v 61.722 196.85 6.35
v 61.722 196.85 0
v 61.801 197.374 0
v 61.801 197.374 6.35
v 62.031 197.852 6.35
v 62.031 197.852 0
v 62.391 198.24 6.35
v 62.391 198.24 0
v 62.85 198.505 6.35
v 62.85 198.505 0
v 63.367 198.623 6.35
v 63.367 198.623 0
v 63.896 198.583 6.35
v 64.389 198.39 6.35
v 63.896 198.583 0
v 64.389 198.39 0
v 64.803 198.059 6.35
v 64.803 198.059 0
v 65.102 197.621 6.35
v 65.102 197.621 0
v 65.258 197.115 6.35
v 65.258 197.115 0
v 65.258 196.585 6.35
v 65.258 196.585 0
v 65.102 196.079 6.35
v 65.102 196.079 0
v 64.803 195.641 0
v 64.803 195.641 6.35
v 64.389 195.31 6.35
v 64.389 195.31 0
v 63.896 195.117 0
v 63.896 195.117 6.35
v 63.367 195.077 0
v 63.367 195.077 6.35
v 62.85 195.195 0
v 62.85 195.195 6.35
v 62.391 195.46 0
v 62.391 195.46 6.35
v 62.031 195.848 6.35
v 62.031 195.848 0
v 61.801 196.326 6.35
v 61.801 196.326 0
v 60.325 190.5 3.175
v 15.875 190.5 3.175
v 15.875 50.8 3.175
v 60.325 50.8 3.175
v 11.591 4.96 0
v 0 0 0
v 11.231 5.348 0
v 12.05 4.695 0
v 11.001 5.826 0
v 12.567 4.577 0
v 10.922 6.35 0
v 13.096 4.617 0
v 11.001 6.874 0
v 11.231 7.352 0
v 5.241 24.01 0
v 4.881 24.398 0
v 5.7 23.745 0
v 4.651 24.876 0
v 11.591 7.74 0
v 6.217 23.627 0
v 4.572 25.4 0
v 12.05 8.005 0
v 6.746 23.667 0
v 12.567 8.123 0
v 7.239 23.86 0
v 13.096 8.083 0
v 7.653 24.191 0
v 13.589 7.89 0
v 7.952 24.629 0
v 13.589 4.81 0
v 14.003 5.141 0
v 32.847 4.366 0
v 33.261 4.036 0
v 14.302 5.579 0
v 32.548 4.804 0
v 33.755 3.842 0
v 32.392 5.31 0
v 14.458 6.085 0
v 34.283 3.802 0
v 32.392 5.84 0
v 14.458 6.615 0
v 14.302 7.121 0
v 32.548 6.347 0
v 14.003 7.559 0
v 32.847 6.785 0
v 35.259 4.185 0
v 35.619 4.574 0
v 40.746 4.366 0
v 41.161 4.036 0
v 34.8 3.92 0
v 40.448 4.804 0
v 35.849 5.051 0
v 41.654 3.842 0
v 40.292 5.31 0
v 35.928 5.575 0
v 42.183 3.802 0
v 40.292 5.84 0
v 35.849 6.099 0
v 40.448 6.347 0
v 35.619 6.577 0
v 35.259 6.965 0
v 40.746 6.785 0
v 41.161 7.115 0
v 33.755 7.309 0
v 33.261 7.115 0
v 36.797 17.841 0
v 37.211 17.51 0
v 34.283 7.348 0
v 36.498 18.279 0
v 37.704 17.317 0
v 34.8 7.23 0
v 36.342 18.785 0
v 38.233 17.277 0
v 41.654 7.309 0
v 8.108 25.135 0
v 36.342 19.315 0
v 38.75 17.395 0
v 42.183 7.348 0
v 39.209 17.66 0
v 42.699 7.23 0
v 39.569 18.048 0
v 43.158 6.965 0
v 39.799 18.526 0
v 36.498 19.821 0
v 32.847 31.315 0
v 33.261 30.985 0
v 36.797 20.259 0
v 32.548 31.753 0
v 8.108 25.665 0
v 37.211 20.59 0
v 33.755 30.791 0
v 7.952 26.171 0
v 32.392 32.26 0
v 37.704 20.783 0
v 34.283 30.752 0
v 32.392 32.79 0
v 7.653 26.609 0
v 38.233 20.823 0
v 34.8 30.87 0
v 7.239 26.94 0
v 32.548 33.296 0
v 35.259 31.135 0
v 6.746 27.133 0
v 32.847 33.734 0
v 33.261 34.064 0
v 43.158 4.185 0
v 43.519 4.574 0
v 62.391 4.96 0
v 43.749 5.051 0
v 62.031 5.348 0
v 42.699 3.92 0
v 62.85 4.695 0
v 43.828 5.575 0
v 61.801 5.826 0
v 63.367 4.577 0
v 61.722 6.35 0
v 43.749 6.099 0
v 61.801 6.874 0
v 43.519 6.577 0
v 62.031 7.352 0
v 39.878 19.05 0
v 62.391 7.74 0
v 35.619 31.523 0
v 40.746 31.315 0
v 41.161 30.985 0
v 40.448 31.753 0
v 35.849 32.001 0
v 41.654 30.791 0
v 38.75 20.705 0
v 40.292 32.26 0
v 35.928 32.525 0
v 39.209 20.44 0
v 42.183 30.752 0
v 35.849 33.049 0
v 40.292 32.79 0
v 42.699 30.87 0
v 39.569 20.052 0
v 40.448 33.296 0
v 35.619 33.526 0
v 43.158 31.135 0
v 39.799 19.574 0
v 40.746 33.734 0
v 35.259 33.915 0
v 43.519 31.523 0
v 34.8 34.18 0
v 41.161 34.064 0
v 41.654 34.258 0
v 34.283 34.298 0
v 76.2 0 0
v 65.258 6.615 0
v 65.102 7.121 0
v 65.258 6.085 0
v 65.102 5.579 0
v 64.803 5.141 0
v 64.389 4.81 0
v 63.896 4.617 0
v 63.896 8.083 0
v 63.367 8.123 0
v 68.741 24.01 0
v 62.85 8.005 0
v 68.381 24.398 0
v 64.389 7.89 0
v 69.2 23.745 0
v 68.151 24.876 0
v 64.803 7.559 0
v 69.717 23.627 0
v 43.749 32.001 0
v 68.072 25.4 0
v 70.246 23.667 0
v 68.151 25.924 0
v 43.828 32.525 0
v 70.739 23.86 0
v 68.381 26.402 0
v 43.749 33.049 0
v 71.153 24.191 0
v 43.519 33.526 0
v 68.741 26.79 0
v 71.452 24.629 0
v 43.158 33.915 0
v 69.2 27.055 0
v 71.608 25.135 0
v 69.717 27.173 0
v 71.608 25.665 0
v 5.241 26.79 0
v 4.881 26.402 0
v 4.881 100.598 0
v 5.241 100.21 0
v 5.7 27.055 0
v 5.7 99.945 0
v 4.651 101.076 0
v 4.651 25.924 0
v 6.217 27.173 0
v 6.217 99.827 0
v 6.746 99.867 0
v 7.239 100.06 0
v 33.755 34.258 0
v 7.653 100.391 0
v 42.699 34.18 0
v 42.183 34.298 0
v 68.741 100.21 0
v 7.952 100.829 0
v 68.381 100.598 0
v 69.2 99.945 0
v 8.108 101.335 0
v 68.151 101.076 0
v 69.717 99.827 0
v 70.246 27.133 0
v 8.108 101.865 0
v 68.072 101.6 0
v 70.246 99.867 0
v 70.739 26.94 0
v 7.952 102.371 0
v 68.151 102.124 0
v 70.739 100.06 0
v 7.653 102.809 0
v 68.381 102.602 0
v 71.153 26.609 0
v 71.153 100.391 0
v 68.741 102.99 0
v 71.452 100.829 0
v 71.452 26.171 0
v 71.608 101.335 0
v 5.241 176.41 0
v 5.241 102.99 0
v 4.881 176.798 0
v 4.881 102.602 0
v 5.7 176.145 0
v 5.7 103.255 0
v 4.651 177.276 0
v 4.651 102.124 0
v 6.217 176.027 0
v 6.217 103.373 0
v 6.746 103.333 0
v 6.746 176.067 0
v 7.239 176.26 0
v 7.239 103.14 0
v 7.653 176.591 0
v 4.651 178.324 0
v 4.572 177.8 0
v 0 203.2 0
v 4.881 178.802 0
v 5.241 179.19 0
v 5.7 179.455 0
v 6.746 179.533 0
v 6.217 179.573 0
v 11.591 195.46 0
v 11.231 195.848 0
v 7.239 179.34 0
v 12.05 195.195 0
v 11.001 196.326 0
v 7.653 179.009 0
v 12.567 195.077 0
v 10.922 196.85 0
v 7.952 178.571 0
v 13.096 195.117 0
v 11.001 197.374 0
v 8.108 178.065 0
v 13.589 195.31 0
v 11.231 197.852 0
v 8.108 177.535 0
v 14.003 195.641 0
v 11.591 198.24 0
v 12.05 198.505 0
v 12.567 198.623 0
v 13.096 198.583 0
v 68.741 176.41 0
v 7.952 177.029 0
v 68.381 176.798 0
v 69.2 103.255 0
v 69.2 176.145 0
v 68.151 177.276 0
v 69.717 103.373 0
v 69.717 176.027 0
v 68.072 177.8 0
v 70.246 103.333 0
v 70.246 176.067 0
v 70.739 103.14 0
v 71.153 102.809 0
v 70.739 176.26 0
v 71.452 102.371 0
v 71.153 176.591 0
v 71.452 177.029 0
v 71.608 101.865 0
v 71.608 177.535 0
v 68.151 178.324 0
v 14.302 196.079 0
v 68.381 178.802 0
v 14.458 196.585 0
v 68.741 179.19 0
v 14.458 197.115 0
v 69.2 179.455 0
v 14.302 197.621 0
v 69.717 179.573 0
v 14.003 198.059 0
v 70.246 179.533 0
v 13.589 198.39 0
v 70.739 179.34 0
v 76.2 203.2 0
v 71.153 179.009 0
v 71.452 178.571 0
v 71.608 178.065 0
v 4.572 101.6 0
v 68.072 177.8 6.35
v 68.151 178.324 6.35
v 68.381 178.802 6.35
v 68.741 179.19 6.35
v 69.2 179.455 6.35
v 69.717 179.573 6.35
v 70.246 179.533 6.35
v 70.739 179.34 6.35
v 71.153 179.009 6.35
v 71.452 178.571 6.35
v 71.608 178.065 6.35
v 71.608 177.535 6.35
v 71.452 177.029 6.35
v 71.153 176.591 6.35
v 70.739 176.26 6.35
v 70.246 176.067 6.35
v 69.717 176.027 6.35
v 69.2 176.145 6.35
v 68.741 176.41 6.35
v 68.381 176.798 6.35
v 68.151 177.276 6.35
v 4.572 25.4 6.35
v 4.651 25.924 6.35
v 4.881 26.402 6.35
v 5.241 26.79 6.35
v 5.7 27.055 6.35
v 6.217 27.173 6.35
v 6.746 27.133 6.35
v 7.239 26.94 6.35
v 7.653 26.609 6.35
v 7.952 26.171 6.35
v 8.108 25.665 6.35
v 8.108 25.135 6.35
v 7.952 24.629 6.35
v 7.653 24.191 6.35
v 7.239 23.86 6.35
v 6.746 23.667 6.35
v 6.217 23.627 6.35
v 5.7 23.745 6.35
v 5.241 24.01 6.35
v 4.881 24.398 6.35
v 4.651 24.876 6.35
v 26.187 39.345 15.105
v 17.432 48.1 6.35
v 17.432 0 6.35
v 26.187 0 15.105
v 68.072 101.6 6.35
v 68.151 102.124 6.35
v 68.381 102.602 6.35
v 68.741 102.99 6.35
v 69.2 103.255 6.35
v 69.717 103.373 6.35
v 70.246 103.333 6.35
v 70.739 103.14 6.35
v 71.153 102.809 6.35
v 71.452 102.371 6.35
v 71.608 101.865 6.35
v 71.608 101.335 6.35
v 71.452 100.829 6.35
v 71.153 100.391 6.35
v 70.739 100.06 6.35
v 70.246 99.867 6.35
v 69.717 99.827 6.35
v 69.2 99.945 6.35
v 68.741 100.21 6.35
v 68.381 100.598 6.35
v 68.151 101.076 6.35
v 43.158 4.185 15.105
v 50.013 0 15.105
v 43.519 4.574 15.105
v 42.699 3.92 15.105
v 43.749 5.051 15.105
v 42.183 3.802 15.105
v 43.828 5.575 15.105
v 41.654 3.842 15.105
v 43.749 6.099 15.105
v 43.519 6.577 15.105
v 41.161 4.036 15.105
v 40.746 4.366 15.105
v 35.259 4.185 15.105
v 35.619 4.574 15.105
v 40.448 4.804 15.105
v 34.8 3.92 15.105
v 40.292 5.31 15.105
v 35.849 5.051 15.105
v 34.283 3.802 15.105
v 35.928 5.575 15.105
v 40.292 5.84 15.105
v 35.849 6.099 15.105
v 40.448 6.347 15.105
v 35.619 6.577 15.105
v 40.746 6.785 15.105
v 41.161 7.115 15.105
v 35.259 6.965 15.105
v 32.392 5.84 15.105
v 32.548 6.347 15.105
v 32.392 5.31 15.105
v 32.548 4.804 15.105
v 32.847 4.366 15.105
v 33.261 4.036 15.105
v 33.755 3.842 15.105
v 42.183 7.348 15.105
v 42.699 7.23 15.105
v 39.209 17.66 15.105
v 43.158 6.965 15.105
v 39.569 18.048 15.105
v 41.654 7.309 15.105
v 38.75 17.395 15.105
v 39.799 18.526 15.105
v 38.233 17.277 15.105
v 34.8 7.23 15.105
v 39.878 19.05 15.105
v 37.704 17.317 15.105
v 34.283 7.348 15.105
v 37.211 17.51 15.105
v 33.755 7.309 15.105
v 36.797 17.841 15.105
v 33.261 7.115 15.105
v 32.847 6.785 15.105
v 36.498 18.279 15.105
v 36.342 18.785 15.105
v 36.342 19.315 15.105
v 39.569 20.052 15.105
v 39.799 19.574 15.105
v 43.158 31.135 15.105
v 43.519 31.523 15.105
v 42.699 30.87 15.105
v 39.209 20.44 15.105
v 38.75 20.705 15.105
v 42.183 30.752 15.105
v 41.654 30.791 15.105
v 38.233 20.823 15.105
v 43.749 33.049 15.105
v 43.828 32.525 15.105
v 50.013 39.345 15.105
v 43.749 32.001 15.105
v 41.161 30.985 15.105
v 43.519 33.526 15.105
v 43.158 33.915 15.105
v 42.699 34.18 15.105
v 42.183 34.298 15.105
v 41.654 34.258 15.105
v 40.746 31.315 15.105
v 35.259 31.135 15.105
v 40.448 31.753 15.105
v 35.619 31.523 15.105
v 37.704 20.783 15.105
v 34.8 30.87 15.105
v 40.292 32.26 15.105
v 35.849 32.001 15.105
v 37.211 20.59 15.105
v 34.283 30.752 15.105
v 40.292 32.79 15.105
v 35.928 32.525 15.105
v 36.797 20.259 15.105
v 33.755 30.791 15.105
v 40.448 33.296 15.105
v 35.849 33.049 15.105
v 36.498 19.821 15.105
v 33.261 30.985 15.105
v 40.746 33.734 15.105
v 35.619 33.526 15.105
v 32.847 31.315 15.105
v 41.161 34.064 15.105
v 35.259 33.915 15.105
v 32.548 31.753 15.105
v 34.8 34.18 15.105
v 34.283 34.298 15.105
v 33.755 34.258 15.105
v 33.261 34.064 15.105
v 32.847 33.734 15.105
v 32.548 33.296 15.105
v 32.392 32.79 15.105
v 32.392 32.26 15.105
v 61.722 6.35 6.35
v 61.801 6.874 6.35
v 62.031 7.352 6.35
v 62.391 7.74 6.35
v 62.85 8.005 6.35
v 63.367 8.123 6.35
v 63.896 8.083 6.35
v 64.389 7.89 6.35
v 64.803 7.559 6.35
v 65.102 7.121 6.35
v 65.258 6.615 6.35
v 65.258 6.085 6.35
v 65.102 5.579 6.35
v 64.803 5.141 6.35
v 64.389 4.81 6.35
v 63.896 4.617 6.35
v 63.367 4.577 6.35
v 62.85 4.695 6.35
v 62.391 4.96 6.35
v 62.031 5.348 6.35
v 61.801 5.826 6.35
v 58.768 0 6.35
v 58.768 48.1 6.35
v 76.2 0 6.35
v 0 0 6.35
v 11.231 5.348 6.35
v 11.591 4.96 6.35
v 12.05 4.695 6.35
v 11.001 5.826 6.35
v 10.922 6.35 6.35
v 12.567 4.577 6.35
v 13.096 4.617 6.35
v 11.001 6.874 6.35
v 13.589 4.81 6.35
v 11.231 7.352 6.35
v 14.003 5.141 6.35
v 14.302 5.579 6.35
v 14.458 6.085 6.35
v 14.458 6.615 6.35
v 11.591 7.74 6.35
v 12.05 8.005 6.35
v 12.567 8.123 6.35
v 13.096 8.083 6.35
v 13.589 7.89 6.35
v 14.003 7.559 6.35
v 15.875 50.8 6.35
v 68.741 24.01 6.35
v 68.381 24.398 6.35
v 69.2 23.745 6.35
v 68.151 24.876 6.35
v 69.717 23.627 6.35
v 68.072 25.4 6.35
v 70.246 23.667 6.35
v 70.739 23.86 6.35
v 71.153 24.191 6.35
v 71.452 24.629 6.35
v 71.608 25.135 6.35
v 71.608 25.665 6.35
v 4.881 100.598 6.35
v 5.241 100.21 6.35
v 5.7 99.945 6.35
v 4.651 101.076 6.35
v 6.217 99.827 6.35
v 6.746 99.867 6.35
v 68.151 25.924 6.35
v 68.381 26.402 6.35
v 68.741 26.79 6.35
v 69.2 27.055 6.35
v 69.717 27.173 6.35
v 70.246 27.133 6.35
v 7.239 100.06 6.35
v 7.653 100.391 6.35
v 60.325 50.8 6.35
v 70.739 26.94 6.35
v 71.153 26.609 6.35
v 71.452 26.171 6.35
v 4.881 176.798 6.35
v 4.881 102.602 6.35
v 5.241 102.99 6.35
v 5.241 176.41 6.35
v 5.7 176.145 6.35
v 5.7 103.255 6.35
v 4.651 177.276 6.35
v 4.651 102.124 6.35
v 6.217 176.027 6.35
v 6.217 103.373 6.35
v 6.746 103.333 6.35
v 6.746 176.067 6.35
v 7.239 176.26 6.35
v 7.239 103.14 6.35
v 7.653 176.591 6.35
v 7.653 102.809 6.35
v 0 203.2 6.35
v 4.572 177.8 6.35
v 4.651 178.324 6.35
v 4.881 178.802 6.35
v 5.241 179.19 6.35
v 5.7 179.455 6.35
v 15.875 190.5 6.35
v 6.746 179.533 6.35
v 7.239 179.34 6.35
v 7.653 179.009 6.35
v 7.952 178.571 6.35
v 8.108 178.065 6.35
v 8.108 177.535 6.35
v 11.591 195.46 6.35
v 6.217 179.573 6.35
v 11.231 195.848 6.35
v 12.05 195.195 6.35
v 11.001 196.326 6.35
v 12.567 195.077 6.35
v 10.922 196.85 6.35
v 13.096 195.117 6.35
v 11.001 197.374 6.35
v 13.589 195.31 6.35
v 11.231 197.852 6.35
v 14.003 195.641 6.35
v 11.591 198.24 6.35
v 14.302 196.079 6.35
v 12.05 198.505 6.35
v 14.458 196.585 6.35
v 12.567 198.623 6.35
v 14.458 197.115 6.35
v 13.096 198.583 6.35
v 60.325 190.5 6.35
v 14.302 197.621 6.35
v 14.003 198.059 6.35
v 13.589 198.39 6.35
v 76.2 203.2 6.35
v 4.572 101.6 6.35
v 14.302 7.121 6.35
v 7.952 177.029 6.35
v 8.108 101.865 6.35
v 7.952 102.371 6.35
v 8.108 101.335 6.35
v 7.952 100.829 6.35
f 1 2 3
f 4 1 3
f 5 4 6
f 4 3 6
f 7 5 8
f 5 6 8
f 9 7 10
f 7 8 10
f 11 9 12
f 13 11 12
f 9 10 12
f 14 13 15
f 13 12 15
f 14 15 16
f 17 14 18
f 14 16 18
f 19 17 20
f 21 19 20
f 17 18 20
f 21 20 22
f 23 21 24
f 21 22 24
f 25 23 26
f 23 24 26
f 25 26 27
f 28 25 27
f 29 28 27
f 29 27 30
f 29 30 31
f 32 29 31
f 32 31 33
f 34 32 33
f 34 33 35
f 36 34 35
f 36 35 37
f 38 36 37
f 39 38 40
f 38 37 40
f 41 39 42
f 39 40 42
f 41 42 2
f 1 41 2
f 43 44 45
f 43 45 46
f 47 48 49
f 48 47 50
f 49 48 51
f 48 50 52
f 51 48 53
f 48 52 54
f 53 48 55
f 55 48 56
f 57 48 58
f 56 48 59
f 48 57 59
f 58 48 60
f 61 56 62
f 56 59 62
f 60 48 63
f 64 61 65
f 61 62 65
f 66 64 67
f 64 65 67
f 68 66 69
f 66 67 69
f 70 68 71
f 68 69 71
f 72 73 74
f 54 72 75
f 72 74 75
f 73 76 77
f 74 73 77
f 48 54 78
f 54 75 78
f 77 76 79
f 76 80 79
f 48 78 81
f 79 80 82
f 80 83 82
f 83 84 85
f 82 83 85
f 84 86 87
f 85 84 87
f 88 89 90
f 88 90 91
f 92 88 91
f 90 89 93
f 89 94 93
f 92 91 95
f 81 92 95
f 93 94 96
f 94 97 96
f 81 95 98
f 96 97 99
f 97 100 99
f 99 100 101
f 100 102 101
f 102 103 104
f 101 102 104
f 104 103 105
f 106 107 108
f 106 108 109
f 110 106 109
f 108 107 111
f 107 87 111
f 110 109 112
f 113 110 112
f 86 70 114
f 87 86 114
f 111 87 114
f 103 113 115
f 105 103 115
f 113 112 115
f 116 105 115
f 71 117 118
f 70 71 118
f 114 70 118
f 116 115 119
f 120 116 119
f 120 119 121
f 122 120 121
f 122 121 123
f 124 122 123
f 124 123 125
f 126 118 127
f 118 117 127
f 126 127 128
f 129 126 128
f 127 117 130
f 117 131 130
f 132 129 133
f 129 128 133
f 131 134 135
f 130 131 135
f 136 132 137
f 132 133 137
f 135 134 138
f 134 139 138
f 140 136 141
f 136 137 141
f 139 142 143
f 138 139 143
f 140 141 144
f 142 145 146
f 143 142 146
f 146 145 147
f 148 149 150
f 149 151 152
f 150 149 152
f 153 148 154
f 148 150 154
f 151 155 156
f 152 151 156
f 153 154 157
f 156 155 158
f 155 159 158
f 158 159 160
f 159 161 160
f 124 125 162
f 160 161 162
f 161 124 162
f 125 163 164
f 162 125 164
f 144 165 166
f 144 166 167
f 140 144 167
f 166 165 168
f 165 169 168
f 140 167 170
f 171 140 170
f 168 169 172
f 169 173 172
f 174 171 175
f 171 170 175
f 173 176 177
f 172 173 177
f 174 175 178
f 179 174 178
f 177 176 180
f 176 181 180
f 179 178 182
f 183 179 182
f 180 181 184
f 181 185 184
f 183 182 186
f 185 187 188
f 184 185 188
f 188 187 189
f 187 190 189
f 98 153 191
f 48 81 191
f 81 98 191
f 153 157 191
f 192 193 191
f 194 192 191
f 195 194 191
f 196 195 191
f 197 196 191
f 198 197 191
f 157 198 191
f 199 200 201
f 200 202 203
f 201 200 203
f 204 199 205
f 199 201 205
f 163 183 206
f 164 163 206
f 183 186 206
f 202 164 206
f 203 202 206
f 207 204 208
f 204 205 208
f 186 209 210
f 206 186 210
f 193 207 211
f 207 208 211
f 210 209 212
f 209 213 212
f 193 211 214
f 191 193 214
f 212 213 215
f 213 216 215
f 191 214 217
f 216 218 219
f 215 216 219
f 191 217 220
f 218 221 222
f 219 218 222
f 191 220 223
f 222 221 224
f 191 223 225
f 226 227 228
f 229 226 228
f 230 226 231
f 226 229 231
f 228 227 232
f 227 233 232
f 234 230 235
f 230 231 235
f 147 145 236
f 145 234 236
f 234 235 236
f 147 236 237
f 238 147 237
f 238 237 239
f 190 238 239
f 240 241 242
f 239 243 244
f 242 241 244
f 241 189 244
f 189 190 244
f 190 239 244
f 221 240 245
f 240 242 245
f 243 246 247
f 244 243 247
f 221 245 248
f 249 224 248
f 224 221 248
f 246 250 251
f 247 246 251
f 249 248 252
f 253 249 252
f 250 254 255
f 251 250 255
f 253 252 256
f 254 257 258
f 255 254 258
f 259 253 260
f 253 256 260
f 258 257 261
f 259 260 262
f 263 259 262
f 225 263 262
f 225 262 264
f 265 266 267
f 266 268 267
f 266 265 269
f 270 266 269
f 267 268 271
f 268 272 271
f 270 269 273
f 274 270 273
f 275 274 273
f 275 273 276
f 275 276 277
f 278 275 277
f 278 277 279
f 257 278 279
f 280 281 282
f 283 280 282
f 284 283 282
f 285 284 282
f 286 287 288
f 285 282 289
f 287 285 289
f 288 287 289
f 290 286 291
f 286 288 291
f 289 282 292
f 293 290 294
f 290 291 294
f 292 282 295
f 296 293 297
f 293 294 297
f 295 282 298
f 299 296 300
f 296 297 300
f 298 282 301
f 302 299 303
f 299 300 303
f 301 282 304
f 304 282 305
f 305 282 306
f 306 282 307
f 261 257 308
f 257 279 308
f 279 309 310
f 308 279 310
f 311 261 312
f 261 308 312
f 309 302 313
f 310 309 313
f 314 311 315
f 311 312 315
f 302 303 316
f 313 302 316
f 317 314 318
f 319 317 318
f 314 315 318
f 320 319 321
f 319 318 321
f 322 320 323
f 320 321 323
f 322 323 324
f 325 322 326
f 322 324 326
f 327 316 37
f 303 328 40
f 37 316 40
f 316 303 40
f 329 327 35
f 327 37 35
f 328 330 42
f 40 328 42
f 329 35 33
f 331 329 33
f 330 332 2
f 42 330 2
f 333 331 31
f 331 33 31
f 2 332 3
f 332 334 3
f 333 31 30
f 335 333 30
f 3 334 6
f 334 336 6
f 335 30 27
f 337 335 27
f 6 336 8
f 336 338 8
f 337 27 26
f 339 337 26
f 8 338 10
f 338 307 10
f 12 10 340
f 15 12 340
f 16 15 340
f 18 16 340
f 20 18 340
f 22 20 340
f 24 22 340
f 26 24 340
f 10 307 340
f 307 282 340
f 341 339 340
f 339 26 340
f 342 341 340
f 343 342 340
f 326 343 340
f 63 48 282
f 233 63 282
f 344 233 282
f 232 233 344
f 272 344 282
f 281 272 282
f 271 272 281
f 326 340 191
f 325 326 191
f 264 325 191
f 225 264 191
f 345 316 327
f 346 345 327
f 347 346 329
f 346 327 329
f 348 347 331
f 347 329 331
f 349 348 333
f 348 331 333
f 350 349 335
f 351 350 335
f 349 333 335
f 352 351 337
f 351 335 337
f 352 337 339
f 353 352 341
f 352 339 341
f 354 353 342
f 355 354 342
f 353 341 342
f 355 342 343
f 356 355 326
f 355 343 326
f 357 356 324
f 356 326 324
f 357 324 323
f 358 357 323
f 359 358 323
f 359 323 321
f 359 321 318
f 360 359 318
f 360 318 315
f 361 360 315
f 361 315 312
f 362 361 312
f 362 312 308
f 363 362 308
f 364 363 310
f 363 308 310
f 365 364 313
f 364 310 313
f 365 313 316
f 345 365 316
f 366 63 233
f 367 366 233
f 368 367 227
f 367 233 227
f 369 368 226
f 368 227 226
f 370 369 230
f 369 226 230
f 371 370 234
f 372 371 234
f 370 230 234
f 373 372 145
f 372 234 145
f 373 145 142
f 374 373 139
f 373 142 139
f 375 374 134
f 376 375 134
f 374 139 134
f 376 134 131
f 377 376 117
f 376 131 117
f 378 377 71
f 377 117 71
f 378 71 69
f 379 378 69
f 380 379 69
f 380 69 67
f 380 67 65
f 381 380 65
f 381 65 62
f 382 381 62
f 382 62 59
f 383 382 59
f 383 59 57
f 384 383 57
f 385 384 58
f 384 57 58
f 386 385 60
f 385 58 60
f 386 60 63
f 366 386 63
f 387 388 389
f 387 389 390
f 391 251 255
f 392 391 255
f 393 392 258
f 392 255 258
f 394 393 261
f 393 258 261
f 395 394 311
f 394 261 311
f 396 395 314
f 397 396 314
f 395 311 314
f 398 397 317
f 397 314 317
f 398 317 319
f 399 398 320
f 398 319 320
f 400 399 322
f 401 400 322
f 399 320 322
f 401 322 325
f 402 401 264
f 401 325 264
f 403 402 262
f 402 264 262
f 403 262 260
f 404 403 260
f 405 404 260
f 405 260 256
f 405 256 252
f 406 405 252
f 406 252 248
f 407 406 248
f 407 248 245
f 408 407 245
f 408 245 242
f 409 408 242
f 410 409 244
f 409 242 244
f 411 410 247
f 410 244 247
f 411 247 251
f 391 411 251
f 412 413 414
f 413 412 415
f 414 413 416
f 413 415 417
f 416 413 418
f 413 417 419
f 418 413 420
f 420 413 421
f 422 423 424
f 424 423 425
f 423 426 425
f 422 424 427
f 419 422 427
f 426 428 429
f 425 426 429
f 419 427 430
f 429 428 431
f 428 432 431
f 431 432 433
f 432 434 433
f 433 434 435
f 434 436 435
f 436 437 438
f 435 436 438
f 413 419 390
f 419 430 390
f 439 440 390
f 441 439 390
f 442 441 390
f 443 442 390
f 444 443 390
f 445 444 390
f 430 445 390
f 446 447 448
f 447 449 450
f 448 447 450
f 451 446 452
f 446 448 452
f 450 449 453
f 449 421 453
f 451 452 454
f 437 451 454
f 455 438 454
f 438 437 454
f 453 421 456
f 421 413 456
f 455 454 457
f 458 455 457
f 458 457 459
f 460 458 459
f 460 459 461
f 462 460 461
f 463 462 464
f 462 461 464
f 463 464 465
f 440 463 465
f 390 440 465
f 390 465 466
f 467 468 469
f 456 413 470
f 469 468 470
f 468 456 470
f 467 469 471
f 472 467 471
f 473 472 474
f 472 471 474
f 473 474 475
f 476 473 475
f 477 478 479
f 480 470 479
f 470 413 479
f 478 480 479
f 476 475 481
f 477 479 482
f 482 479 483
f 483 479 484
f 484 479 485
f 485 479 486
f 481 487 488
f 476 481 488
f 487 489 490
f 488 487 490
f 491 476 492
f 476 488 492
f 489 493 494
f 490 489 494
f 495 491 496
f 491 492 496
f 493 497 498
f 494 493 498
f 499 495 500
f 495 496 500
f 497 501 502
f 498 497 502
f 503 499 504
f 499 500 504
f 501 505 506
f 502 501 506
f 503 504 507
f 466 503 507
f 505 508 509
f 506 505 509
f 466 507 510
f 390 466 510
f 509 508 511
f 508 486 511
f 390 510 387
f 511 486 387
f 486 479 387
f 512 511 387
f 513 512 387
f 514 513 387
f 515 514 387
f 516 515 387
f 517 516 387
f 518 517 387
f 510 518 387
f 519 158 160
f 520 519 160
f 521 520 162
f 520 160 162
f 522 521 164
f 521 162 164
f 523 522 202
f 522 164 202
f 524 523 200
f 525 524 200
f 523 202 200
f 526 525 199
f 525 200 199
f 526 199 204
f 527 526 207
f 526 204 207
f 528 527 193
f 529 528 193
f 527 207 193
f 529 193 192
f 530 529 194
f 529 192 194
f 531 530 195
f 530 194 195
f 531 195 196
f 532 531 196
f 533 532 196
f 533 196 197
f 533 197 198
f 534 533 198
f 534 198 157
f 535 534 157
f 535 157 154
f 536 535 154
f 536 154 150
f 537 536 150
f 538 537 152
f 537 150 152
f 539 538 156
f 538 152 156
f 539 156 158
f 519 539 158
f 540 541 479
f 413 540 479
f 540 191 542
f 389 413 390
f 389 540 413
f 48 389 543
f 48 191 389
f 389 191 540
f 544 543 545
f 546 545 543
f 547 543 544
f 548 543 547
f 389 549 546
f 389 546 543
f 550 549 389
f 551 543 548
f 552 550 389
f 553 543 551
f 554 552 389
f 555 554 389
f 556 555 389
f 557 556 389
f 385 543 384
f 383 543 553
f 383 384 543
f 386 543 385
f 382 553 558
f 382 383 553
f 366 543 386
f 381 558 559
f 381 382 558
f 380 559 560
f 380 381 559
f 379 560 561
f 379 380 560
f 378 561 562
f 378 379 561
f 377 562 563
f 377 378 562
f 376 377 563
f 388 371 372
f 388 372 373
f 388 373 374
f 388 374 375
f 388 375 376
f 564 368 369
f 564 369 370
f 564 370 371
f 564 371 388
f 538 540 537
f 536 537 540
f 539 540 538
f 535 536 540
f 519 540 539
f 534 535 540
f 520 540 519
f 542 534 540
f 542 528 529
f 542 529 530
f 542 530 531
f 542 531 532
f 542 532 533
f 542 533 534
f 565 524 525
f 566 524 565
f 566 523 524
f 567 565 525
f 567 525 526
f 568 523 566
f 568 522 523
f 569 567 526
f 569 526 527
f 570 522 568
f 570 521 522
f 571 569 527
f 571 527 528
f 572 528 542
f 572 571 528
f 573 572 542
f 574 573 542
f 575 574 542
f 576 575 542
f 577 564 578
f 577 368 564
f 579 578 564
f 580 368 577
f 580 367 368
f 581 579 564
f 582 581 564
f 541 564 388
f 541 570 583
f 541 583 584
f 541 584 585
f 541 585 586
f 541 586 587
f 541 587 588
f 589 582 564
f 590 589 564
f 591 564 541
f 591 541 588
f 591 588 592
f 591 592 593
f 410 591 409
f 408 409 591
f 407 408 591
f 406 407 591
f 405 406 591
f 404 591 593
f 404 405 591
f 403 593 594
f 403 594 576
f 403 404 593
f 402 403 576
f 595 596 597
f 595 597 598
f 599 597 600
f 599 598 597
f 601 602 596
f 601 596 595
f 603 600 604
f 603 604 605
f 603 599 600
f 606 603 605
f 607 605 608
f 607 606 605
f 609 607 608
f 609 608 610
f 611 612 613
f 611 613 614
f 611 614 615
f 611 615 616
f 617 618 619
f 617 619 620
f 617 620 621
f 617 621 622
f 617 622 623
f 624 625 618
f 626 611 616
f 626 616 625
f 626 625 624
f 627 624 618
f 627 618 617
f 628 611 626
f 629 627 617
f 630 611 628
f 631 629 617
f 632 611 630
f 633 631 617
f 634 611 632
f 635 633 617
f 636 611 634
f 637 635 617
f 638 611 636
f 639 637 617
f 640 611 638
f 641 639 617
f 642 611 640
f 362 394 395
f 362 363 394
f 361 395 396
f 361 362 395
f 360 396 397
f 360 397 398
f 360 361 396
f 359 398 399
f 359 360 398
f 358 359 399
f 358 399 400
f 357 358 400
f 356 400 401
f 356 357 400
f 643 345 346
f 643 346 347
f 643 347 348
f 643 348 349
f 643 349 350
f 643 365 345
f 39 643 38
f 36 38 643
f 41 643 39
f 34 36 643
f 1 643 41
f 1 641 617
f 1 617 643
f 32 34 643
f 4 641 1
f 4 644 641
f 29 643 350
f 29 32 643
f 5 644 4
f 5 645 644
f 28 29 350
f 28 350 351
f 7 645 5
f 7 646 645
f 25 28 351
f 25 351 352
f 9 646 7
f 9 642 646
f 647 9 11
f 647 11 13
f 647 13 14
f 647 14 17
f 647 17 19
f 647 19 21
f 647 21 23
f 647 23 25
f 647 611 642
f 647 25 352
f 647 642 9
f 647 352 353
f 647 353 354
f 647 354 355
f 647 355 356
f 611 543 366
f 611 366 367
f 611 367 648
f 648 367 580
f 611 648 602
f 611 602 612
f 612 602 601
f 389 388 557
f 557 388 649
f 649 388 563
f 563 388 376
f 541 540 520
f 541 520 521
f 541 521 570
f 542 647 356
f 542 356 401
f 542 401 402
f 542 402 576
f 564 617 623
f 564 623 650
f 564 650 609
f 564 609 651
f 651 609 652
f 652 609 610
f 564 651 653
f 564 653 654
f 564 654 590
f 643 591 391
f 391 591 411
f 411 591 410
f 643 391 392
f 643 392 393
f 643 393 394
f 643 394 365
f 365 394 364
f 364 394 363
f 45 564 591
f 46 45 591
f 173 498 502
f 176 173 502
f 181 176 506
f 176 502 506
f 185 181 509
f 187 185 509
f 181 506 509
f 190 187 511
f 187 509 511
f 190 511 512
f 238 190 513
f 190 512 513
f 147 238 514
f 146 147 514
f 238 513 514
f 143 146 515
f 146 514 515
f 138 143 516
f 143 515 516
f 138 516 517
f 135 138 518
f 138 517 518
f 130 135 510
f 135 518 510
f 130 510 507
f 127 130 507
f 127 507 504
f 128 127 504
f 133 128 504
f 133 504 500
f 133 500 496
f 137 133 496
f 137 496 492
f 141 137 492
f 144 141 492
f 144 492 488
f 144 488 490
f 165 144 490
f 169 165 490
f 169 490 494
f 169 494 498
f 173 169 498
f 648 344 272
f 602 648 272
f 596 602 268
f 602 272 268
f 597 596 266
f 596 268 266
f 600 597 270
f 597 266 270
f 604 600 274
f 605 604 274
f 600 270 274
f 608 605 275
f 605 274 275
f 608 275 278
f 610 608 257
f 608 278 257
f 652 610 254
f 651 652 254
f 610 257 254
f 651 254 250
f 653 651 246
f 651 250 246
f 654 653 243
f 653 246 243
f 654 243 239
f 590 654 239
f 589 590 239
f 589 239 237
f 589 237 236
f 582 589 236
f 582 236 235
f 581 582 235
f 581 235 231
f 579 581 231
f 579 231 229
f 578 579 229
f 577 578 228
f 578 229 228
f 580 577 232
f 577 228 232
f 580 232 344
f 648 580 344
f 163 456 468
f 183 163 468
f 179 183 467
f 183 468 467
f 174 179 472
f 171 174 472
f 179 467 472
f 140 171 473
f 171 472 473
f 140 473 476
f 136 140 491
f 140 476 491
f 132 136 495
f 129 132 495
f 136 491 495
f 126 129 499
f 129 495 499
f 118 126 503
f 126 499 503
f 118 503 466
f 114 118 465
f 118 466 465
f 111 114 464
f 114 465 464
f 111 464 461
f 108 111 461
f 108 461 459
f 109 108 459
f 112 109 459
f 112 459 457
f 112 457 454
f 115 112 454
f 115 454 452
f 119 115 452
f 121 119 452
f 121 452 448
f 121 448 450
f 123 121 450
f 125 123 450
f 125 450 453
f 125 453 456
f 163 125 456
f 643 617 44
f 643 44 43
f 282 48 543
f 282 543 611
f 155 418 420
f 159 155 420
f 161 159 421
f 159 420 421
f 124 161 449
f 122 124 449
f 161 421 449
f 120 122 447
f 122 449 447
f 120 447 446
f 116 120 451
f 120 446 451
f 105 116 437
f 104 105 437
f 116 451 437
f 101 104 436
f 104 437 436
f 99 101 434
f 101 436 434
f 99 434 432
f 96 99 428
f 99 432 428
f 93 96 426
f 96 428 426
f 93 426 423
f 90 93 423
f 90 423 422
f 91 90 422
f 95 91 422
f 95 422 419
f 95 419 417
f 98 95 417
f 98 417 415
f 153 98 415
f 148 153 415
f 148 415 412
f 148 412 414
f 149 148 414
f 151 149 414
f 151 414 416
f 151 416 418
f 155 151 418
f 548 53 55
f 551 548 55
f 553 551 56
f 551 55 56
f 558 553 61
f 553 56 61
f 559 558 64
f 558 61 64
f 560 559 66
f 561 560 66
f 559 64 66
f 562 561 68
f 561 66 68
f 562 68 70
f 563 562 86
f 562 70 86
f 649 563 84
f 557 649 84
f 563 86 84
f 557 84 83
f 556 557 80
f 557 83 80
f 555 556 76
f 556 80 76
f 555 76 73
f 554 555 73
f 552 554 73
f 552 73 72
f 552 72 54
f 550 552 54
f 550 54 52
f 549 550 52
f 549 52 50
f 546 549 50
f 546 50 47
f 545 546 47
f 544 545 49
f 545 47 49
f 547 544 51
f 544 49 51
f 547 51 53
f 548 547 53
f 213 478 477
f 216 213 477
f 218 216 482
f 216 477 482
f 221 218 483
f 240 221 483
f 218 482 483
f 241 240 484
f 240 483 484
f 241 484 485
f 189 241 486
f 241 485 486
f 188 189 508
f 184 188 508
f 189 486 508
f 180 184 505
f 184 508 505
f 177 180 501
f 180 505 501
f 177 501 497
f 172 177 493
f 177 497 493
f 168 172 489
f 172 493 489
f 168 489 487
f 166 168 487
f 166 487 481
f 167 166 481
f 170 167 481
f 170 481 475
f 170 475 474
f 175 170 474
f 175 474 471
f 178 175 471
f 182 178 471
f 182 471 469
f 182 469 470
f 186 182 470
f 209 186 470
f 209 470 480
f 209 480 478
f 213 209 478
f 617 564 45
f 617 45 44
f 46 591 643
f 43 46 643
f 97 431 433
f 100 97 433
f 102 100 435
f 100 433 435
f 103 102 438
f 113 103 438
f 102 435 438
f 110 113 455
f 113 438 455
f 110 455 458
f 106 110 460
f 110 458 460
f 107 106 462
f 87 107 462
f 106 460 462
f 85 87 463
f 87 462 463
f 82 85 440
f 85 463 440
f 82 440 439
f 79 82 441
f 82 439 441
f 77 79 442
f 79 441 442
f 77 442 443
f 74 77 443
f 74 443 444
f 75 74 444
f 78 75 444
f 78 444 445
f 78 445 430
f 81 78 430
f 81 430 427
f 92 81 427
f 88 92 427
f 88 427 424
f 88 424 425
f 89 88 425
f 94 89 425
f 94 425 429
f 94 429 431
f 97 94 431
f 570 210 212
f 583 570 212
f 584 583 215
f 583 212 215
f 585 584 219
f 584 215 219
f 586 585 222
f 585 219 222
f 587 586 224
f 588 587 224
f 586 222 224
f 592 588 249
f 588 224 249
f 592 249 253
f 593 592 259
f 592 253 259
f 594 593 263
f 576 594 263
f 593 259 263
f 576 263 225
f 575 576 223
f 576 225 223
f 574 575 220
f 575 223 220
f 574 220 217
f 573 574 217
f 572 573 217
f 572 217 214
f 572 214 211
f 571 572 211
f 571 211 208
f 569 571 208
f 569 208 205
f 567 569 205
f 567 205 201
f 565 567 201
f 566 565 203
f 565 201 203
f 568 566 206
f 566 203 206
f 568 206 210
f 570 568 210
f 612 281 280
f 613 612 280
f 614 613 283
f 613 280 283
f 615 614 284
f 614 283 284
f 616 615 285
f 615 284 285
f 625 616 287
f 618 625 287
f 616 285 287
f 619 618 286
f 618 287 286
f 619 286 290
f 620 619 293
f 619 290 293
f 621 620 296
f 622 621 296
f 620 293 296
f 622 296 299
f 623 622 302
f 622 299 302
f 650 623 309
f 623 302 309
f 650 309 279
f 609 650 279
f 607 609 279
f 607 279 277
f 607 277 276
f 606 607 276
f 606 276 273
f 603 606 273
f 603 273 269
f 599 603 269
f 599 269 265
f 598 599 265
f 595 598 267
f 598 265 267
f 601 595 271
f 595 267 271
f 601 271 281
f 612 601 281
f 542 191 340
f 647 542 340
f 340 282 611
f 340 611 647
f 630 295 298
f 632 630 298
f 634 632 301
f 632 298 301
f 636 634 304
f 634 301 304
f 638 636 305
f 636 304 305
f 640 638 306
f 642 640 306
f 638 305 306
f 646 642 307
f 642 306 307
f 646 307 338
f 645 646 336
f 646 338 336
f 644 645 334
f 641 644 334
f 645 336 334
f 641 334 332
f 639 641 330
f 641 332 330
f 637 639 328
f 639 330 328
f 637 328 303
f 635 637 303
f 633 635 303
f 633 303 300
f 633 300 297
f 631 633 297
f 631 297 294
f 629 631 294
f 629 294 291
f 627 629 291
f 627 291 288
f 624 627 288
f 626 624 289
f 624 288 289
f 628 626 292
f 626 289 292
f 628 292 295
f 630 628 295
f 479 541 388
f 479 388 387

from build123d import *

# Parameters (mm, degrees)
SKETCH1_W           = 76.2
SKETCH1_H           = 203.2
BOSS_EXTRUDE1_DEPTH = 6.35
SKETCH6_R           = 1.778
CUT_EXTRUDE4_DEPTH  = 6.35
SKETCH7_W           = 21.336
SKETCH7_H           = 38.1
BOSS_EXTRUDE2_DEPTH = 8.754615714
SKETCH8_R           = 1.778
CUT_EXTRUDE5_DEPTH  = 218.542707108
SKETCH9_W           = 44.45
SKETCH9_H           = 139.7
CUT_EXTRUDE6_DEPTH  = 3.175
CHAMFER1_SIZE       = 10


with BuildPart() as part:
    # Sketch1 → Boss-Extrude1 (new body)
    with BuildSketch(Plane.XY):
        with Locations((38.1, 101.6)):
            Rectangle(SKETCH1_W, SKETCH1_H)
    extrude(amount=BOSS_EXTRUDE1_DEPTH)

    # Sketch6 → Cut-Extrude4 (cut)
    with BuildSketch(Plane(origin=(0, 0, 0), x_dir=(-1, 0, 0), z_dir=(0, 0, -1))):
        with Locations((-63.5, 6.35)):
            Circle(SKETCH6_R)
        with Locations((-12.7, 6.35)):
            Circle(SKETCH6_R)
        with Locations((-6.35, 177.8)):
            Circle(SKETCH6_R)
        with Locations((-6.35, 25.4)):
            Circle(SKETCH6_R)
        with Locations((-69.85, 25.4)):
            Circle(SKETCH6_R)
        with Locations((-69.85, 177.8)):
            Circle(SKETCH6_R)
        with Locations((-63.5, 196.85)):
            Circle(SKETCH6_R)
        with Locations((-12.7, 196.85)):
            Circle(SKETCH6_R)
        with Locations((-6.35, 101.6)):
            Circle(SKETCH6_R)
        with Locations((-69.85, 101.6)):
            Circle(SKETCH6_R)
    extrude(amount=-CUT_EXTRUDE4_DEPTH, mode=Mode.SUBTRACT)

    # Sketch7 → Boss-Extrude2 (add)
    with BuildSketch(Plane.XY.offset(6.35)):
        with Locations((38.1, 19.05)):
            Rectangle(SKETCH7_W, SKETCH7_H)
    extrude(amount=BOSS_EXTRUDE2_DEPTH)

    # Sketch8 → Cut-Extrude5 (cut, through all)
    with BuildSketch(Plane.XY.offset(15.104615714)):
        with Locations((34.1503, 5.5753)):
            Circle(SKETCH8_R)
        with Locations((42.0497, 5.5753)):
            Circle(SKETCH8_R)
        with Locations((42.0497, 32.5247)):
            Circle(SKETCH8_R)
        with Locations((34.1503, 32.5247)):
            Circle(SKETCH8_R)
        with Locations((38.1, 19.05)):
            Circle(SKETCH8_R)
    extrude(amount=-CUT_EXTRUDE5_DEPTH, mode=Mode.SUBTRACT)

    # Sketch9 → Cut-Extrude6 (cut)
    with BuildSketch(Plane.XY.offset(6.35)):
        with Locations((38.1, 120.65)):
            Rectangle(SKETCH9_W, SKETCH9_H)
    extrude(amount=-CUT_EXTRUDE6_DEPTH, mode=Mode.SUBTRACT)

    # Chamfer1
    # the kernel refuses this chamfer: 10 mm, written as the material it adds along each edge
    with BuildSketch(Plane(origin=(27.432, 38.1, 6.35), x_dir=(-0.9996219169112968, 0, -0.027495876610586403), z_dir=(0, -1, 0))) as chamfer1_piece_1_section:
        Polygon((CHAMFER1_SIZE * 0.999621916911, -CHAMFER1_SIZE * 0.0274958766106), (-CHAMFER1_SIZE * 0.0274958766106, -CHAMFER1_SIZE * 0.999621916911), (0, 0), align=None)
    chamfer1_piece_1 = extrude(amount=38.1, mode=Mode.PRIVATE)
    chamfer1_piece_1 = split(chamfer1_piece_1, bisect_by=Plane(origin=(24.052510744, 19.05, 15.104615714), z_dir=(0, 0, -1)), keep=Keep.TOP, mode=Mode.PRIVATE)
    add(chamfer1_piece_1)
    with BuildSketch(Plane(origin=(48.768, 38.1, 6.35), x_dir=(0, 0.9996219169112968, -0.027495876610586403), z_dir=(-1, 0, 0))) as chamfer1_piece_2_section:
        Polygon((CHAMFER1_SIZE * 0.999621916911, -CHAMFER1_SIZE * 0.0274958766106), (-CHAMFER1_SIZE * 0.0274958766106, -CHAMFER1_SIZE * 0.999621916911), (0, 0), align=None)
    chamfer1_piece_2 = extrude(amount=21.336, mode=Mode.PRIVATE)
    chamfer1_piece_2 = split(chamfer1_piece_2, bisect_by=Plane(origin=(38.1, 41.479489256, 15.104615714), z_dir=(0, 0, -1)), keep=Keep.TOP, mode=Mode.PRIVATE)
    add(chamfer1_piece_2)
    with BuildSketch(Plane(origin=(48.768, 0, 6.35), x_dir=(0.9996219169112968, 0, -0.027495876610586403), z_dir=(0, 1, 0))) as chamfer1_piece_3_section:
        Polygon((CHAMFER1_SIZE * 0.999621916911, -CHAMFER1_SIZE * 0.0274958766106), (-CHAMFER1_SIZE * 0.0274958766106, -CHAMFER1_SIZE * 0.999621916911), (0, 0), align=None)
    chamfer1_piece_3 = extrude(amount=38.1, mode=Mode.PRIVATE)
    chamfer1_piece_3 = split(chamfer1_piece_3, bisect_by=Plane(origin=(52.147489256, 19.05, 15.104615714), z_dir=(0, 0, -1)), keep=Keep.TOP, mode=Mode.PRIVATE)
    add(chamfer1_piece_3)
    with BuildSketch(Plane(origin=(27.432, 63.81682988, 6.35), x_dir=(-0.9996219169112968, 0, -0.027495876610586403), z_dir=(0, -1, 0))) as chamfer1_piece_4a_section:
        Polygon((CHAMFER1_SIZE * 0.999621916911, -CHAMFER1_SIZE * 0.0274958766106), (-CHAMFER1_SIZE * 0.0274958766106, -CHAMFER1_SIZE * 0.999621916911), (0, 0), align=None)
    chamfer1_piece_4a = extrude(amount=63.81682988, mode=Mode.PRIVATE)
    chamfer1_piece_4a = split(chamfer1_piece_4a, bisect_by=Plane(origin=(24.052510744, 50.8, 9.492641484), z_dir=(0, -1, 0)), keep=Keep.TOP, mode=Mode.PRIVATE)
    chamfer1_piece_4a = split(chamfer1_piece_4a, bisect_by=Plane(origin=(24.052510744, 38.1, 9.492641484), z_dir=(0, 1, 0)), keep=Keep.TOP, mode=Mode.PRIVATE)
    chamfer1_piece_4a = split(chamfer1_piece_4a, bisect_by=Plane(origin=(24.052510744, 44.45, 15.104615714), z_dir=(0, 0, -1)), keep=Keep.TOP, mode=Mode.PRIVATE)
    with BuildSketch(Plane(origin=(48.768, 38.1, 6.35), x_dir=(0, 0.9996219169112968, -0.027495876610586403), z_dir=(-1, 0, 0))) as chamfer1_piece_4b_section:
        Polygon((CHAMFER1_SIZE * 0.999621916911, -CHAMFER1_SIZE * 0.0274958766106), (-CHAMFER1_SIZE * 0.0274958766106, -CHAMFER1_SIZE * 0.999621916911), (0, 0), align=None)
    chamfer1_piece_4b = extrude(amount=47.05282988, mode=Mode.PRIVATE)
    chamfer1_piece_4b = split(chamfer1_piece_4b, bisect_by=Plane(origin=(27.432, 41.479489256, 9.492641484), z_dir=(-1, 0, 0)), keep=Keep.TOP, mode=Mode.PRIVATE)
    chamfer1_piece_4b = split(chamfer1_piece_4b, bisect_by=Plane(origin=(14.57358506, 41.479489256, 15.104615714), z_dir=(0, 0, -1)), keep=Keep.TOP, mode=Mode.PRIVATE)
    chamfer1_piece_4 = chamfer1_piece_4a & chamfer1_piece_4b
    add(chamfer1_piece_4)
    with BuildSketch(Plane(origin=(74.48482988, 38.1, 6.35), x_dir=(0, 0.9996219169112968, -0.027495876610586403), z_dir=(-1, 0, 0))) as chamfer1_piece_5a_section:
        Polygon((CHAMFER1_SIZE * 0.999621916911, -CHAMFER1_SIZE * 0.0274958766106), (-CHAMFER1_SIZE * 0.0274958766106, -CHAMFER1_SIZE * 0.999621916911), (0, 0), align=None)
    chamfer1_piece_5a = extrude(amount=47.05282988, mode=Mode.PRIVATE)
    chamfer1_piece_5a = split(chamfer1_piece_5a, bisect_by=Plane(origin=(61.62641494, 41.479489256, 15.104615714), z_dir=(0, 0, -1)), keep=Keep.TOP, mode=Mode.PRIVATE)
    chamfer1_piece_5a = split(chamfer1_piece_5a, bisect_by=Plane(origin=(48.768, 41.479489256, 9.492641484), z_dir=(1, 0, 0)), keep=Keep.TOP, mode=Mode.PRIVATE)
    with BuildSketch(Plane(origin=(48.768, 0, 6.35), x_dir=(0.9996219169112968, 0, -0.027495876610586403), z_dir=(0, 1, 0))) as chamfer1_piece_5b_section:
        Polygon((CHAMFER1_SIZE * 0.999621916911, -CHAMFER1_SIZE * 0.0274958766106), (-CHAMFER1_SIZE * 0.0274958766106, -CHAMFER1_SIZE * 0.999621916911), (0, 0), align=None)
    chamfer1_piece_5b = extrude(amount=63.81682988, mode=Mode.PRIVATE)
    chamfer1_piece_5b = split(chamfer1_piece_5b, bisect_by=Plane(origin=(52.147489256, 50.8, 9.492641484), z_dir=(0, -1, 0)), keep=Keep.TOP, mode=Mode.PRIVATE)
    chamfer1_piece_5b = split(chamfer1_piece_5b, bisect_by=Plane(origin=(52.147489256, 44.45, 15.104615714), z_dir=(0, 0, -1)), keep=Keep.TOP, mode=Mode.PRIVATE)
    chamfer1_piece_5b = split(chamfer1_piece_5b, bisect_by=Plane(origin=(52.147489256, 38.1, 9.492641484), z_dir=(0, 1, 0)), keep=Keep.TOP, mode=Mode.PRIVATE)
    chamfer1_piece_5 = chamfer1_piece_5a & chamfer1_piece_5b
    add(chamfer1_piece_5)


solid = part.part
